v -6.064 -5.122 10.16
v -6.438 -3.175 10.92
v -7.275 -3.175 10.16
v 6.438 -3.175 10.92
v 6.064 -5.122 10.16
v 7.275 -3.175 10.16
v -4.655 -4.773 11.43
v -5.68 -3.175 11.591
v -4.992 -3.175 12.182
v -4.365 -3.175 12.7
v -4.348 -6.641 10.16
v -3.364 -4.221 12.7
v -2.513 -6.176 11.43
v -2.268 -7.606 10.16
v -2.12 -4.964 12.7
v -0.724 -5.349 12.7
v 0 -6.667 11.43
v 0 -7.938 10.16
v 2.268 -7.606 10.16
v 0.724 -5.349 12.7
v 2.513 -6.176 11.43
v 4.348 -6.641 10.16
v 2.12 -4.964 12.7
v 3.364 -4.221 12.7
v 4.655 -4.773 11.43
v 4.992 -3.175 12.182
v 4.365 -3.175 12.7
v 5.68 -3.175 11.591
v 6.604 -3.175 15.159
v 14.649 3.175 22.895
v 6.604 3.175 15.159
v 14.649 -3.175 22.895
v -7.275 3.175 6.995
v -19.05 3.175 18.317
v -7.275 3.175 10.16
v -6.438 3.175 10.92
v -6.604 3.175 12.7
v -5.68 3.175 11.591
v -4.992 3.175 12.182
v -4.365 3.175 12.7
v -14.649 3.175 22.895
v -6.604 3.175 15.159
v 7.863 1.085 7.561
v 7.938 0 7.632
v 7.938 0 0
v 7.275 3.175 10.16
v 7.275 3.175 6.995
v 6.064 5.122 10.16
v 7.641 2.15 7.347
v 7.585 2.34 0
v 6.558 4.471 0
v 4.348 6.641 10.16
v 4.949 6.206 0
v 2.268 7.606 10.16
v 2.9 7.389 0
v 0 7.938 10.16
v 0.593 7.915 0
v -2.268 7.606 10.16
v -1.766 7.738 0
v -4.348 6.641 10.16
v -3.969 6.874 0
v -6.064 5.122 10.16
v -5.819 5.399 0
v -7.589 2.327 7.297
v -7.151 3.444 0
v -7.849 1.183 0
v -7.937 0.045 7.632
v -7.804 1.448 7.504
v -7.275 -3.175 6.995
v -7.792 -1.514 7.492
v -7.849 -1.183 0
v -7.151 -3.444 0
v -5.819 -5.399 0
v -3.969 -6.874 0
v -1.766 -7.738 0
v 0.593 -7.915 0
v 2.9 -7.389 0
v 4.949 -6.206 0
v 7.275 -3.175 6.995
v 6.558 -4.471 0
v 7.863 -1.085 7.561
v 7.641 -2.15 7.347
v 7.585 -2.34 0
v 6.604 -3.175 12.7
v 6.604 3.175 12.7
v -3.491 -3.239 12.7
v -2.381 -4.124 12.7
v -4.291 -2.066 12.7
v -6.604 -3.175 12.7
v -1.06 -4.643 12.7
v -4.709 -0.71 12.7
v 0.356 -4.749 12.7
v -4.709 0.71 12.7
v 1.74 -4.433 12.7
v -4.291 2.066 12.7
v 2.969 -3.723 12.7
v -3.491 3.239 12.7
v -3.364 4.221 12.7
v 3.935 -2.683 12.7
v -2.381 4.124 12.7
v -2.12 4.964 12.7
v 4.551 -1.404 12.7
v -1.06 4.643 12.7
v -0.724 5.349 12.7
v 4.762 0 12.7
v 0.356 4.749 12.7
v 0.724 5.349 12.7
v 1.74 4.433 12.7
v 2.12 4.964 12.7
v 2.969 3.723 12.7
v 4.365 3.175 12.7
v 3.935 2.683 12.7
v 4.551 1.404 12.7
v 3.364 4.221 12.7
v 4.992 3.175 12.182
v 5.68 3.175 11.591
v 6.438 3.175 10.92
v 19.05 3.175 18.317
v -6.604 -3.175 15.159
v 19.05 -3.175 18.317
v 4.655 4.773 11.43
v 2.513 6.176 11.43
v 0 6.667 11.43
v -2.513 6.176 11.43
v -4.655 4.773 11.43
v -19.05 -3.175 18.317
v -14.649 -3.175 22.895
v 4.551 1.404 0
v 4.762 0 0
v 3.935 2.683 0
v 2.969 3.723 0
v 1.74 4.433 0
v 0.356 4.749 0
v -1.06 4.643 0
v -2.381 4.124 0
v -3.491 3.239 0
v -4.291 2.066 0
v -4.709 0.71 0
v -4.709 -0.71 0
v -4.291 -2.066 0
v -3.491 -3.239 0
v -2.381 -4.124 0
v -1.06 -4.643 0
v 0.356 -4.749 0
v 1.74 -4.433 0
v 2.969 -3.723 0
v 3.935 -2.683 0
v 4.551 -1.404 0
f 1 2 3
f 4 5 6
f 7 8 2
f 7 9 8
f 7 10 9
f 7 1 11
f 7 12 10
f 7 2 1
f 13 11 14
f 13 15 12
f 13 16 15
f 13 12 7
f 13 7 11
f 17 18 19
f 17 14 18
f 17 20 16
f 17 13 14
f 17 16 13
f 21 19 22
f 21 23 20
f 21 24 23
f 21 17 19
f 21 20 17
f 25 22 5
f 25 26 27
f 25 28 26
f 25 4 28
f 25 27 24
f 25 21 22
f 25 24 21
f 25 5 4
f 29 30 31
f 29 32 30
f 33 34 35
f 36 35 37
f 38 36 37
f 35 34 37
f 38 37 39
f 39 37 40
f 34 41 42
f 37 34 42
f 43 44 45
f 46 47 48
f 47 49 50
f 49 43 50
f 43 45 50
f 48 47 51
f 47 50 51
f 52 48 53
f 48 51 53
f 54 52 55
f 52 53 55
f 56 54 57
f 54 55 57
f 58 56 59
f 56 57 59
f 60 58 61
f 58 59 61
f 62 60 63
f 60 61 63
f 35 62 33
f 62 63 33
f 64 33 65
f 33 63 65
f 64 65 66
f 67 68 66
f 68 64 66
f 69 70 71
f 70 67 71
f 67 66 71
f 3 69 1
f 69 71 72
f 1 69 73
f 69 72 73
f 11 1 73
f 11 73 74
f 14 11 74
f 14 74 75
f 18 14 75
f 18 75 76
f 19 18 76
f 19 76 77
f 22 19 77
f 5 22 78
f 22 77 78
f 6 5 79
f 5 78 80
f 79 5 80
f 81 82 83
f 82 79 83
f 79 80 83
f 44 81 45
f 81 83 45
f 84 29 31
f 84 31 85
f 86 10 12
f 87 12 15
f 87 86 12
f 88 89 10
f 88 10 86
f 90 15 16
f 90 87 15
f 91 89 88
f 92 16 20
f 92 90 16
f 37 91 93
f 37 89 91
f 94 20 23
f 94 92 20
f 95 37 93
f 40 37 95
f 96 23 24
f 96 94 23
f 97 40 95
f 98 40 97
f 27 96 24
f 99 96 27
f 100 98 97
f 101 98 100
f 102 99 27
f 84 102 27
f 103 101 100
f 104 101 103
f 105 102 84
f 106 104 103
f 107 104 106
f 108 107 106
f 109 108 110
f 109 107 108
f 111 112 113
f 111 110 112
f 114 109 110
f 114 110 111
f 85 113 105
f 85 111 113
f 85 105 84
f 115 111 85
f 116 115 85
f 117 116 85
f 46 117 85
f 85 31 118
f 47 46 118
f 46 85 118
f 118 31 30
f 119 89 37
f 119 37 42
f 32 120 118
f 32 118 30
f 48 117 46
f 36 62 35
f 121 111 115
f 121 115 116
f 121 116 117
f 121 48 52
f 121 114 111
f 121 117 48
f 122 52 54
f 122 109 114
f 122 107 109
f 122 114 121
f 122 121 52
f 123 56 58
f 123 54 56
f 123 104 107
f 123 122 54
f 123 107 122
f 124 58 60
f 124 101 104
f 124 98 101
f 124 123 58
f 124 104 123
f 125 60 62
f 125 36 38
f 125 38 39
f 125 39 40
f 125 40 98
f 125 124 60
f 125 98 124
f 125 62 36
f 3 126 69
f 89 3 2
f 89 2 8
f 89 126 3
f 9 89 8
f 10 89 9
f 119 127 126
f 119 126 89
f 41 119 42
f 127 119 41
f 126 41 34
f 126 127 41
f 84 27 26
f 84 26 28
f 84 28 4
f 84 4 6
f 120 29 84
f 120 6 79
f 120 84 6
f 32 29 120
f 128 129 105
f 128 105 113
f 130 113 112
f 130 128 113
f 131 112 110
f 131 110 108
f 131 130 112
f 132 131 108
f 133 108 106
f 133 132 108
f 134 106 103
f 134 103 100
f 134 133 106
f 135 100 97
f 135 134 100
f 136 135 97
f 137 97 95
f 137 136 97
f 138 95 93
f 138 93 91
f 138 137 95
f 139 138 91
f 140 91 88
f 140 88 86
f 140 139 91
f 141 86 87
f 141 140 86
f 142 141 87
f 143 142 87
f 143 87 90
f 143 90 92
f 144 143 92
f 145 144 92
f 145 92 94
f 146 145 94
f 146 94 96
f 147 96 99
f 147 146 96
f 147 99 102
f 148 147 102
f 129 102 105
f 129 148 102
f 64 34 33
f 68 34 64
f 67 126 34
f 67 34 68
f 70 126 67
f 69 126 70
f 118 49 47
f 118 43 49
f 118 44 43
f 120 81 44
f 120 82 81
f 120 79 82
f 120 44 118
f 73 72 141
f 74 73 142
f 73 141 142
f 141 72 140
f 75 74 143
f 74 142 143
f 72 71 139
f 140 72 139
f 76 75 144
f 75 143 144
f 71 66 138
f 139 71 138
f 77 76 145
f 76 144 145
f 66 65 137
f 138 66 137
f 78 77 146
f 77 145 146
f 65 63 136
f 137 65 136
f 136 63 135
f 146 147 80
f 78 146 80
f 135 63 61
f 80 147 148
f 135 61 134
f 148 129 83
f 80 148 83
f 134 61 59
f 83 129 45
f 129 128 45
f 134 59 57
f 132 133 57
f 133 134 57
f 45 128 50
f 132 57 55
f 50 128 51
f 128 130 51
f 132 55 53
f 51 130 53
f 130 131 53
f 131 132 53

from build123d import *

# Parameters (mm, degrees)
F1_DEPTH      = 3.175
F1_DEPTH_BACK = 3.175
F2_R          = 7.9375
F2_R_2        = 4.7625
F3_DEPTH      = 12.7
F4_T4_ANGLE   = 227.2280154593
F4_T9_ANGLE   = 227.2280154593


# Not quite as in the source:
# - a fillet or chamfer that OpenCascade refuses, or shapes differently, is made with other operations: its cross-section is extruded or revolved along the edge and cut away or added


with BuildPart() as f1:
    # F0 (on Front) → F1 (new body, two sides)
    with BuildSketch(Plane.XZ) as f1_sk:
        Polygon((-19.05, 18.3173076923), (-6.604, 6.35), (-6.604, 15.1592518354), (-14.6487596518, 22.8945976544), align=None)
    extrude(amount=F1_DEPTH)
    extrude(f1_sk.sketch, amount=-F1_DEPTH_BACK)



with BuildPart() as f1b:
    # F0 (on Front) → F1, piece 2 (new body, two sides)
    with BuildSketch(Plane.XZ) as f1_2_sk:
        Polygon((6.604, 15.1592518354), (6.604, 6.35), (19.05, 18.3173076923), (14.6487596518, 22.8945976544), align=None)
    extrude(amount=F1_DEPTH)
    extrude(f1_2_sk.sketch, amount=-F1_DEPTH_BACK)


with BuildPart() as f1_1:
    add(f1.part)

    add(f1b.part)  # F3 merges F1b
    # F2 (on Top) → F3 (join)
    with BuildSketch(Plane.XY):
        Circle(F2_R)
        Circle(F2_R_2, mode=Mode.SUBTRACT)
    extrude(amount=F3_DEPTH)

    # F4: chamfer of 2.54 on 2 edges, made by hand


with BuildPart() as f4_tool2:
    # F4_s3 → F4_t4 (revolve)
    with BuildSketch(Plane(origin=(0, 0, 0), x_dir=(0, 0, 1), z_dir=(0.4005730539, 0.9162648244, 0))):
        with BuildLine():
            Line((10.088157951, -8.009342049), (12.771842049, -5.325657951))
            Line((12.771842049, -5.325657951), (12.822642049, -5.325657951))
            ThreePointArc((12.822642049, -5.325657951), (12.7508, -6.6315789755), (12.7508, -7.9375))
            Line((12.7508, -7.9375), (12.7, -7.9883))
            ThreePointArc((12.7, -7.9883), (11.3940789755, -7.9883), (10.088157951, -8.060142049))
            Line((10.088157951, -8.060142049), (10.088157951, -8.009342049))
        make_face()
    revolve(axis=Axis((0, 0, 12.7), (0, 0, 1)), revolution_arc=F4_T4_ANGLE)

    split(bisect_by=Plane.XZ.offset(3.175), keep=Keep.TOP)


with BuildPart() as f1_2:
    add(f1_1.part)

    # F4_t1: cut F4_tool2
    add(f4_tool2.part, mode=Mode.SUBTRACT)


with BuildPart() as f4_tool7:
    # F4_s8 → F4_t9 (revolve)
    with BuildSketch(Plane(origin=(0, 0, 0), x_dir=(0, 0, 1), z_dir=(-0.4005730539, -0.9162648244, 0))):
        with BuildLine():
            Line((10.088157951, -8.009342049), (12.771842049, -5.325657951))
            Line((12.771842049, -5.325657951), (12.822642049, -5.325657951))
            ThreePointArc((12.822642049, -5.325657951), (12.7508, -6.6315789755), (12.7508, -7.9375))
            Line((12.7508, -7.9375), (12.7, -7.9883))
            ThreePointArc((12.7, -7.9883), (11.3940789755, -7.9883), (10.088157951, -8.060142049))
            Line((10.088157951, -8.060142049), (10.088157951, -8.009342049))
        make_face()
    revolve(axis=Axis((0, 0, 12.7), (0, 0, 1)), revolution_arc=F4_T9_ANGLE)

    split(bisect_by=Plane.XZ.offset(-3.175), keep=Keep.BOTTOM)


with BuildPart() as f1_3:
    add(f1_2.part)

    # F4_t6: cut F4_tool7
    add(f4_tool7.part, mode=Mode.SUBTRACT)


solid = f1_3.part
